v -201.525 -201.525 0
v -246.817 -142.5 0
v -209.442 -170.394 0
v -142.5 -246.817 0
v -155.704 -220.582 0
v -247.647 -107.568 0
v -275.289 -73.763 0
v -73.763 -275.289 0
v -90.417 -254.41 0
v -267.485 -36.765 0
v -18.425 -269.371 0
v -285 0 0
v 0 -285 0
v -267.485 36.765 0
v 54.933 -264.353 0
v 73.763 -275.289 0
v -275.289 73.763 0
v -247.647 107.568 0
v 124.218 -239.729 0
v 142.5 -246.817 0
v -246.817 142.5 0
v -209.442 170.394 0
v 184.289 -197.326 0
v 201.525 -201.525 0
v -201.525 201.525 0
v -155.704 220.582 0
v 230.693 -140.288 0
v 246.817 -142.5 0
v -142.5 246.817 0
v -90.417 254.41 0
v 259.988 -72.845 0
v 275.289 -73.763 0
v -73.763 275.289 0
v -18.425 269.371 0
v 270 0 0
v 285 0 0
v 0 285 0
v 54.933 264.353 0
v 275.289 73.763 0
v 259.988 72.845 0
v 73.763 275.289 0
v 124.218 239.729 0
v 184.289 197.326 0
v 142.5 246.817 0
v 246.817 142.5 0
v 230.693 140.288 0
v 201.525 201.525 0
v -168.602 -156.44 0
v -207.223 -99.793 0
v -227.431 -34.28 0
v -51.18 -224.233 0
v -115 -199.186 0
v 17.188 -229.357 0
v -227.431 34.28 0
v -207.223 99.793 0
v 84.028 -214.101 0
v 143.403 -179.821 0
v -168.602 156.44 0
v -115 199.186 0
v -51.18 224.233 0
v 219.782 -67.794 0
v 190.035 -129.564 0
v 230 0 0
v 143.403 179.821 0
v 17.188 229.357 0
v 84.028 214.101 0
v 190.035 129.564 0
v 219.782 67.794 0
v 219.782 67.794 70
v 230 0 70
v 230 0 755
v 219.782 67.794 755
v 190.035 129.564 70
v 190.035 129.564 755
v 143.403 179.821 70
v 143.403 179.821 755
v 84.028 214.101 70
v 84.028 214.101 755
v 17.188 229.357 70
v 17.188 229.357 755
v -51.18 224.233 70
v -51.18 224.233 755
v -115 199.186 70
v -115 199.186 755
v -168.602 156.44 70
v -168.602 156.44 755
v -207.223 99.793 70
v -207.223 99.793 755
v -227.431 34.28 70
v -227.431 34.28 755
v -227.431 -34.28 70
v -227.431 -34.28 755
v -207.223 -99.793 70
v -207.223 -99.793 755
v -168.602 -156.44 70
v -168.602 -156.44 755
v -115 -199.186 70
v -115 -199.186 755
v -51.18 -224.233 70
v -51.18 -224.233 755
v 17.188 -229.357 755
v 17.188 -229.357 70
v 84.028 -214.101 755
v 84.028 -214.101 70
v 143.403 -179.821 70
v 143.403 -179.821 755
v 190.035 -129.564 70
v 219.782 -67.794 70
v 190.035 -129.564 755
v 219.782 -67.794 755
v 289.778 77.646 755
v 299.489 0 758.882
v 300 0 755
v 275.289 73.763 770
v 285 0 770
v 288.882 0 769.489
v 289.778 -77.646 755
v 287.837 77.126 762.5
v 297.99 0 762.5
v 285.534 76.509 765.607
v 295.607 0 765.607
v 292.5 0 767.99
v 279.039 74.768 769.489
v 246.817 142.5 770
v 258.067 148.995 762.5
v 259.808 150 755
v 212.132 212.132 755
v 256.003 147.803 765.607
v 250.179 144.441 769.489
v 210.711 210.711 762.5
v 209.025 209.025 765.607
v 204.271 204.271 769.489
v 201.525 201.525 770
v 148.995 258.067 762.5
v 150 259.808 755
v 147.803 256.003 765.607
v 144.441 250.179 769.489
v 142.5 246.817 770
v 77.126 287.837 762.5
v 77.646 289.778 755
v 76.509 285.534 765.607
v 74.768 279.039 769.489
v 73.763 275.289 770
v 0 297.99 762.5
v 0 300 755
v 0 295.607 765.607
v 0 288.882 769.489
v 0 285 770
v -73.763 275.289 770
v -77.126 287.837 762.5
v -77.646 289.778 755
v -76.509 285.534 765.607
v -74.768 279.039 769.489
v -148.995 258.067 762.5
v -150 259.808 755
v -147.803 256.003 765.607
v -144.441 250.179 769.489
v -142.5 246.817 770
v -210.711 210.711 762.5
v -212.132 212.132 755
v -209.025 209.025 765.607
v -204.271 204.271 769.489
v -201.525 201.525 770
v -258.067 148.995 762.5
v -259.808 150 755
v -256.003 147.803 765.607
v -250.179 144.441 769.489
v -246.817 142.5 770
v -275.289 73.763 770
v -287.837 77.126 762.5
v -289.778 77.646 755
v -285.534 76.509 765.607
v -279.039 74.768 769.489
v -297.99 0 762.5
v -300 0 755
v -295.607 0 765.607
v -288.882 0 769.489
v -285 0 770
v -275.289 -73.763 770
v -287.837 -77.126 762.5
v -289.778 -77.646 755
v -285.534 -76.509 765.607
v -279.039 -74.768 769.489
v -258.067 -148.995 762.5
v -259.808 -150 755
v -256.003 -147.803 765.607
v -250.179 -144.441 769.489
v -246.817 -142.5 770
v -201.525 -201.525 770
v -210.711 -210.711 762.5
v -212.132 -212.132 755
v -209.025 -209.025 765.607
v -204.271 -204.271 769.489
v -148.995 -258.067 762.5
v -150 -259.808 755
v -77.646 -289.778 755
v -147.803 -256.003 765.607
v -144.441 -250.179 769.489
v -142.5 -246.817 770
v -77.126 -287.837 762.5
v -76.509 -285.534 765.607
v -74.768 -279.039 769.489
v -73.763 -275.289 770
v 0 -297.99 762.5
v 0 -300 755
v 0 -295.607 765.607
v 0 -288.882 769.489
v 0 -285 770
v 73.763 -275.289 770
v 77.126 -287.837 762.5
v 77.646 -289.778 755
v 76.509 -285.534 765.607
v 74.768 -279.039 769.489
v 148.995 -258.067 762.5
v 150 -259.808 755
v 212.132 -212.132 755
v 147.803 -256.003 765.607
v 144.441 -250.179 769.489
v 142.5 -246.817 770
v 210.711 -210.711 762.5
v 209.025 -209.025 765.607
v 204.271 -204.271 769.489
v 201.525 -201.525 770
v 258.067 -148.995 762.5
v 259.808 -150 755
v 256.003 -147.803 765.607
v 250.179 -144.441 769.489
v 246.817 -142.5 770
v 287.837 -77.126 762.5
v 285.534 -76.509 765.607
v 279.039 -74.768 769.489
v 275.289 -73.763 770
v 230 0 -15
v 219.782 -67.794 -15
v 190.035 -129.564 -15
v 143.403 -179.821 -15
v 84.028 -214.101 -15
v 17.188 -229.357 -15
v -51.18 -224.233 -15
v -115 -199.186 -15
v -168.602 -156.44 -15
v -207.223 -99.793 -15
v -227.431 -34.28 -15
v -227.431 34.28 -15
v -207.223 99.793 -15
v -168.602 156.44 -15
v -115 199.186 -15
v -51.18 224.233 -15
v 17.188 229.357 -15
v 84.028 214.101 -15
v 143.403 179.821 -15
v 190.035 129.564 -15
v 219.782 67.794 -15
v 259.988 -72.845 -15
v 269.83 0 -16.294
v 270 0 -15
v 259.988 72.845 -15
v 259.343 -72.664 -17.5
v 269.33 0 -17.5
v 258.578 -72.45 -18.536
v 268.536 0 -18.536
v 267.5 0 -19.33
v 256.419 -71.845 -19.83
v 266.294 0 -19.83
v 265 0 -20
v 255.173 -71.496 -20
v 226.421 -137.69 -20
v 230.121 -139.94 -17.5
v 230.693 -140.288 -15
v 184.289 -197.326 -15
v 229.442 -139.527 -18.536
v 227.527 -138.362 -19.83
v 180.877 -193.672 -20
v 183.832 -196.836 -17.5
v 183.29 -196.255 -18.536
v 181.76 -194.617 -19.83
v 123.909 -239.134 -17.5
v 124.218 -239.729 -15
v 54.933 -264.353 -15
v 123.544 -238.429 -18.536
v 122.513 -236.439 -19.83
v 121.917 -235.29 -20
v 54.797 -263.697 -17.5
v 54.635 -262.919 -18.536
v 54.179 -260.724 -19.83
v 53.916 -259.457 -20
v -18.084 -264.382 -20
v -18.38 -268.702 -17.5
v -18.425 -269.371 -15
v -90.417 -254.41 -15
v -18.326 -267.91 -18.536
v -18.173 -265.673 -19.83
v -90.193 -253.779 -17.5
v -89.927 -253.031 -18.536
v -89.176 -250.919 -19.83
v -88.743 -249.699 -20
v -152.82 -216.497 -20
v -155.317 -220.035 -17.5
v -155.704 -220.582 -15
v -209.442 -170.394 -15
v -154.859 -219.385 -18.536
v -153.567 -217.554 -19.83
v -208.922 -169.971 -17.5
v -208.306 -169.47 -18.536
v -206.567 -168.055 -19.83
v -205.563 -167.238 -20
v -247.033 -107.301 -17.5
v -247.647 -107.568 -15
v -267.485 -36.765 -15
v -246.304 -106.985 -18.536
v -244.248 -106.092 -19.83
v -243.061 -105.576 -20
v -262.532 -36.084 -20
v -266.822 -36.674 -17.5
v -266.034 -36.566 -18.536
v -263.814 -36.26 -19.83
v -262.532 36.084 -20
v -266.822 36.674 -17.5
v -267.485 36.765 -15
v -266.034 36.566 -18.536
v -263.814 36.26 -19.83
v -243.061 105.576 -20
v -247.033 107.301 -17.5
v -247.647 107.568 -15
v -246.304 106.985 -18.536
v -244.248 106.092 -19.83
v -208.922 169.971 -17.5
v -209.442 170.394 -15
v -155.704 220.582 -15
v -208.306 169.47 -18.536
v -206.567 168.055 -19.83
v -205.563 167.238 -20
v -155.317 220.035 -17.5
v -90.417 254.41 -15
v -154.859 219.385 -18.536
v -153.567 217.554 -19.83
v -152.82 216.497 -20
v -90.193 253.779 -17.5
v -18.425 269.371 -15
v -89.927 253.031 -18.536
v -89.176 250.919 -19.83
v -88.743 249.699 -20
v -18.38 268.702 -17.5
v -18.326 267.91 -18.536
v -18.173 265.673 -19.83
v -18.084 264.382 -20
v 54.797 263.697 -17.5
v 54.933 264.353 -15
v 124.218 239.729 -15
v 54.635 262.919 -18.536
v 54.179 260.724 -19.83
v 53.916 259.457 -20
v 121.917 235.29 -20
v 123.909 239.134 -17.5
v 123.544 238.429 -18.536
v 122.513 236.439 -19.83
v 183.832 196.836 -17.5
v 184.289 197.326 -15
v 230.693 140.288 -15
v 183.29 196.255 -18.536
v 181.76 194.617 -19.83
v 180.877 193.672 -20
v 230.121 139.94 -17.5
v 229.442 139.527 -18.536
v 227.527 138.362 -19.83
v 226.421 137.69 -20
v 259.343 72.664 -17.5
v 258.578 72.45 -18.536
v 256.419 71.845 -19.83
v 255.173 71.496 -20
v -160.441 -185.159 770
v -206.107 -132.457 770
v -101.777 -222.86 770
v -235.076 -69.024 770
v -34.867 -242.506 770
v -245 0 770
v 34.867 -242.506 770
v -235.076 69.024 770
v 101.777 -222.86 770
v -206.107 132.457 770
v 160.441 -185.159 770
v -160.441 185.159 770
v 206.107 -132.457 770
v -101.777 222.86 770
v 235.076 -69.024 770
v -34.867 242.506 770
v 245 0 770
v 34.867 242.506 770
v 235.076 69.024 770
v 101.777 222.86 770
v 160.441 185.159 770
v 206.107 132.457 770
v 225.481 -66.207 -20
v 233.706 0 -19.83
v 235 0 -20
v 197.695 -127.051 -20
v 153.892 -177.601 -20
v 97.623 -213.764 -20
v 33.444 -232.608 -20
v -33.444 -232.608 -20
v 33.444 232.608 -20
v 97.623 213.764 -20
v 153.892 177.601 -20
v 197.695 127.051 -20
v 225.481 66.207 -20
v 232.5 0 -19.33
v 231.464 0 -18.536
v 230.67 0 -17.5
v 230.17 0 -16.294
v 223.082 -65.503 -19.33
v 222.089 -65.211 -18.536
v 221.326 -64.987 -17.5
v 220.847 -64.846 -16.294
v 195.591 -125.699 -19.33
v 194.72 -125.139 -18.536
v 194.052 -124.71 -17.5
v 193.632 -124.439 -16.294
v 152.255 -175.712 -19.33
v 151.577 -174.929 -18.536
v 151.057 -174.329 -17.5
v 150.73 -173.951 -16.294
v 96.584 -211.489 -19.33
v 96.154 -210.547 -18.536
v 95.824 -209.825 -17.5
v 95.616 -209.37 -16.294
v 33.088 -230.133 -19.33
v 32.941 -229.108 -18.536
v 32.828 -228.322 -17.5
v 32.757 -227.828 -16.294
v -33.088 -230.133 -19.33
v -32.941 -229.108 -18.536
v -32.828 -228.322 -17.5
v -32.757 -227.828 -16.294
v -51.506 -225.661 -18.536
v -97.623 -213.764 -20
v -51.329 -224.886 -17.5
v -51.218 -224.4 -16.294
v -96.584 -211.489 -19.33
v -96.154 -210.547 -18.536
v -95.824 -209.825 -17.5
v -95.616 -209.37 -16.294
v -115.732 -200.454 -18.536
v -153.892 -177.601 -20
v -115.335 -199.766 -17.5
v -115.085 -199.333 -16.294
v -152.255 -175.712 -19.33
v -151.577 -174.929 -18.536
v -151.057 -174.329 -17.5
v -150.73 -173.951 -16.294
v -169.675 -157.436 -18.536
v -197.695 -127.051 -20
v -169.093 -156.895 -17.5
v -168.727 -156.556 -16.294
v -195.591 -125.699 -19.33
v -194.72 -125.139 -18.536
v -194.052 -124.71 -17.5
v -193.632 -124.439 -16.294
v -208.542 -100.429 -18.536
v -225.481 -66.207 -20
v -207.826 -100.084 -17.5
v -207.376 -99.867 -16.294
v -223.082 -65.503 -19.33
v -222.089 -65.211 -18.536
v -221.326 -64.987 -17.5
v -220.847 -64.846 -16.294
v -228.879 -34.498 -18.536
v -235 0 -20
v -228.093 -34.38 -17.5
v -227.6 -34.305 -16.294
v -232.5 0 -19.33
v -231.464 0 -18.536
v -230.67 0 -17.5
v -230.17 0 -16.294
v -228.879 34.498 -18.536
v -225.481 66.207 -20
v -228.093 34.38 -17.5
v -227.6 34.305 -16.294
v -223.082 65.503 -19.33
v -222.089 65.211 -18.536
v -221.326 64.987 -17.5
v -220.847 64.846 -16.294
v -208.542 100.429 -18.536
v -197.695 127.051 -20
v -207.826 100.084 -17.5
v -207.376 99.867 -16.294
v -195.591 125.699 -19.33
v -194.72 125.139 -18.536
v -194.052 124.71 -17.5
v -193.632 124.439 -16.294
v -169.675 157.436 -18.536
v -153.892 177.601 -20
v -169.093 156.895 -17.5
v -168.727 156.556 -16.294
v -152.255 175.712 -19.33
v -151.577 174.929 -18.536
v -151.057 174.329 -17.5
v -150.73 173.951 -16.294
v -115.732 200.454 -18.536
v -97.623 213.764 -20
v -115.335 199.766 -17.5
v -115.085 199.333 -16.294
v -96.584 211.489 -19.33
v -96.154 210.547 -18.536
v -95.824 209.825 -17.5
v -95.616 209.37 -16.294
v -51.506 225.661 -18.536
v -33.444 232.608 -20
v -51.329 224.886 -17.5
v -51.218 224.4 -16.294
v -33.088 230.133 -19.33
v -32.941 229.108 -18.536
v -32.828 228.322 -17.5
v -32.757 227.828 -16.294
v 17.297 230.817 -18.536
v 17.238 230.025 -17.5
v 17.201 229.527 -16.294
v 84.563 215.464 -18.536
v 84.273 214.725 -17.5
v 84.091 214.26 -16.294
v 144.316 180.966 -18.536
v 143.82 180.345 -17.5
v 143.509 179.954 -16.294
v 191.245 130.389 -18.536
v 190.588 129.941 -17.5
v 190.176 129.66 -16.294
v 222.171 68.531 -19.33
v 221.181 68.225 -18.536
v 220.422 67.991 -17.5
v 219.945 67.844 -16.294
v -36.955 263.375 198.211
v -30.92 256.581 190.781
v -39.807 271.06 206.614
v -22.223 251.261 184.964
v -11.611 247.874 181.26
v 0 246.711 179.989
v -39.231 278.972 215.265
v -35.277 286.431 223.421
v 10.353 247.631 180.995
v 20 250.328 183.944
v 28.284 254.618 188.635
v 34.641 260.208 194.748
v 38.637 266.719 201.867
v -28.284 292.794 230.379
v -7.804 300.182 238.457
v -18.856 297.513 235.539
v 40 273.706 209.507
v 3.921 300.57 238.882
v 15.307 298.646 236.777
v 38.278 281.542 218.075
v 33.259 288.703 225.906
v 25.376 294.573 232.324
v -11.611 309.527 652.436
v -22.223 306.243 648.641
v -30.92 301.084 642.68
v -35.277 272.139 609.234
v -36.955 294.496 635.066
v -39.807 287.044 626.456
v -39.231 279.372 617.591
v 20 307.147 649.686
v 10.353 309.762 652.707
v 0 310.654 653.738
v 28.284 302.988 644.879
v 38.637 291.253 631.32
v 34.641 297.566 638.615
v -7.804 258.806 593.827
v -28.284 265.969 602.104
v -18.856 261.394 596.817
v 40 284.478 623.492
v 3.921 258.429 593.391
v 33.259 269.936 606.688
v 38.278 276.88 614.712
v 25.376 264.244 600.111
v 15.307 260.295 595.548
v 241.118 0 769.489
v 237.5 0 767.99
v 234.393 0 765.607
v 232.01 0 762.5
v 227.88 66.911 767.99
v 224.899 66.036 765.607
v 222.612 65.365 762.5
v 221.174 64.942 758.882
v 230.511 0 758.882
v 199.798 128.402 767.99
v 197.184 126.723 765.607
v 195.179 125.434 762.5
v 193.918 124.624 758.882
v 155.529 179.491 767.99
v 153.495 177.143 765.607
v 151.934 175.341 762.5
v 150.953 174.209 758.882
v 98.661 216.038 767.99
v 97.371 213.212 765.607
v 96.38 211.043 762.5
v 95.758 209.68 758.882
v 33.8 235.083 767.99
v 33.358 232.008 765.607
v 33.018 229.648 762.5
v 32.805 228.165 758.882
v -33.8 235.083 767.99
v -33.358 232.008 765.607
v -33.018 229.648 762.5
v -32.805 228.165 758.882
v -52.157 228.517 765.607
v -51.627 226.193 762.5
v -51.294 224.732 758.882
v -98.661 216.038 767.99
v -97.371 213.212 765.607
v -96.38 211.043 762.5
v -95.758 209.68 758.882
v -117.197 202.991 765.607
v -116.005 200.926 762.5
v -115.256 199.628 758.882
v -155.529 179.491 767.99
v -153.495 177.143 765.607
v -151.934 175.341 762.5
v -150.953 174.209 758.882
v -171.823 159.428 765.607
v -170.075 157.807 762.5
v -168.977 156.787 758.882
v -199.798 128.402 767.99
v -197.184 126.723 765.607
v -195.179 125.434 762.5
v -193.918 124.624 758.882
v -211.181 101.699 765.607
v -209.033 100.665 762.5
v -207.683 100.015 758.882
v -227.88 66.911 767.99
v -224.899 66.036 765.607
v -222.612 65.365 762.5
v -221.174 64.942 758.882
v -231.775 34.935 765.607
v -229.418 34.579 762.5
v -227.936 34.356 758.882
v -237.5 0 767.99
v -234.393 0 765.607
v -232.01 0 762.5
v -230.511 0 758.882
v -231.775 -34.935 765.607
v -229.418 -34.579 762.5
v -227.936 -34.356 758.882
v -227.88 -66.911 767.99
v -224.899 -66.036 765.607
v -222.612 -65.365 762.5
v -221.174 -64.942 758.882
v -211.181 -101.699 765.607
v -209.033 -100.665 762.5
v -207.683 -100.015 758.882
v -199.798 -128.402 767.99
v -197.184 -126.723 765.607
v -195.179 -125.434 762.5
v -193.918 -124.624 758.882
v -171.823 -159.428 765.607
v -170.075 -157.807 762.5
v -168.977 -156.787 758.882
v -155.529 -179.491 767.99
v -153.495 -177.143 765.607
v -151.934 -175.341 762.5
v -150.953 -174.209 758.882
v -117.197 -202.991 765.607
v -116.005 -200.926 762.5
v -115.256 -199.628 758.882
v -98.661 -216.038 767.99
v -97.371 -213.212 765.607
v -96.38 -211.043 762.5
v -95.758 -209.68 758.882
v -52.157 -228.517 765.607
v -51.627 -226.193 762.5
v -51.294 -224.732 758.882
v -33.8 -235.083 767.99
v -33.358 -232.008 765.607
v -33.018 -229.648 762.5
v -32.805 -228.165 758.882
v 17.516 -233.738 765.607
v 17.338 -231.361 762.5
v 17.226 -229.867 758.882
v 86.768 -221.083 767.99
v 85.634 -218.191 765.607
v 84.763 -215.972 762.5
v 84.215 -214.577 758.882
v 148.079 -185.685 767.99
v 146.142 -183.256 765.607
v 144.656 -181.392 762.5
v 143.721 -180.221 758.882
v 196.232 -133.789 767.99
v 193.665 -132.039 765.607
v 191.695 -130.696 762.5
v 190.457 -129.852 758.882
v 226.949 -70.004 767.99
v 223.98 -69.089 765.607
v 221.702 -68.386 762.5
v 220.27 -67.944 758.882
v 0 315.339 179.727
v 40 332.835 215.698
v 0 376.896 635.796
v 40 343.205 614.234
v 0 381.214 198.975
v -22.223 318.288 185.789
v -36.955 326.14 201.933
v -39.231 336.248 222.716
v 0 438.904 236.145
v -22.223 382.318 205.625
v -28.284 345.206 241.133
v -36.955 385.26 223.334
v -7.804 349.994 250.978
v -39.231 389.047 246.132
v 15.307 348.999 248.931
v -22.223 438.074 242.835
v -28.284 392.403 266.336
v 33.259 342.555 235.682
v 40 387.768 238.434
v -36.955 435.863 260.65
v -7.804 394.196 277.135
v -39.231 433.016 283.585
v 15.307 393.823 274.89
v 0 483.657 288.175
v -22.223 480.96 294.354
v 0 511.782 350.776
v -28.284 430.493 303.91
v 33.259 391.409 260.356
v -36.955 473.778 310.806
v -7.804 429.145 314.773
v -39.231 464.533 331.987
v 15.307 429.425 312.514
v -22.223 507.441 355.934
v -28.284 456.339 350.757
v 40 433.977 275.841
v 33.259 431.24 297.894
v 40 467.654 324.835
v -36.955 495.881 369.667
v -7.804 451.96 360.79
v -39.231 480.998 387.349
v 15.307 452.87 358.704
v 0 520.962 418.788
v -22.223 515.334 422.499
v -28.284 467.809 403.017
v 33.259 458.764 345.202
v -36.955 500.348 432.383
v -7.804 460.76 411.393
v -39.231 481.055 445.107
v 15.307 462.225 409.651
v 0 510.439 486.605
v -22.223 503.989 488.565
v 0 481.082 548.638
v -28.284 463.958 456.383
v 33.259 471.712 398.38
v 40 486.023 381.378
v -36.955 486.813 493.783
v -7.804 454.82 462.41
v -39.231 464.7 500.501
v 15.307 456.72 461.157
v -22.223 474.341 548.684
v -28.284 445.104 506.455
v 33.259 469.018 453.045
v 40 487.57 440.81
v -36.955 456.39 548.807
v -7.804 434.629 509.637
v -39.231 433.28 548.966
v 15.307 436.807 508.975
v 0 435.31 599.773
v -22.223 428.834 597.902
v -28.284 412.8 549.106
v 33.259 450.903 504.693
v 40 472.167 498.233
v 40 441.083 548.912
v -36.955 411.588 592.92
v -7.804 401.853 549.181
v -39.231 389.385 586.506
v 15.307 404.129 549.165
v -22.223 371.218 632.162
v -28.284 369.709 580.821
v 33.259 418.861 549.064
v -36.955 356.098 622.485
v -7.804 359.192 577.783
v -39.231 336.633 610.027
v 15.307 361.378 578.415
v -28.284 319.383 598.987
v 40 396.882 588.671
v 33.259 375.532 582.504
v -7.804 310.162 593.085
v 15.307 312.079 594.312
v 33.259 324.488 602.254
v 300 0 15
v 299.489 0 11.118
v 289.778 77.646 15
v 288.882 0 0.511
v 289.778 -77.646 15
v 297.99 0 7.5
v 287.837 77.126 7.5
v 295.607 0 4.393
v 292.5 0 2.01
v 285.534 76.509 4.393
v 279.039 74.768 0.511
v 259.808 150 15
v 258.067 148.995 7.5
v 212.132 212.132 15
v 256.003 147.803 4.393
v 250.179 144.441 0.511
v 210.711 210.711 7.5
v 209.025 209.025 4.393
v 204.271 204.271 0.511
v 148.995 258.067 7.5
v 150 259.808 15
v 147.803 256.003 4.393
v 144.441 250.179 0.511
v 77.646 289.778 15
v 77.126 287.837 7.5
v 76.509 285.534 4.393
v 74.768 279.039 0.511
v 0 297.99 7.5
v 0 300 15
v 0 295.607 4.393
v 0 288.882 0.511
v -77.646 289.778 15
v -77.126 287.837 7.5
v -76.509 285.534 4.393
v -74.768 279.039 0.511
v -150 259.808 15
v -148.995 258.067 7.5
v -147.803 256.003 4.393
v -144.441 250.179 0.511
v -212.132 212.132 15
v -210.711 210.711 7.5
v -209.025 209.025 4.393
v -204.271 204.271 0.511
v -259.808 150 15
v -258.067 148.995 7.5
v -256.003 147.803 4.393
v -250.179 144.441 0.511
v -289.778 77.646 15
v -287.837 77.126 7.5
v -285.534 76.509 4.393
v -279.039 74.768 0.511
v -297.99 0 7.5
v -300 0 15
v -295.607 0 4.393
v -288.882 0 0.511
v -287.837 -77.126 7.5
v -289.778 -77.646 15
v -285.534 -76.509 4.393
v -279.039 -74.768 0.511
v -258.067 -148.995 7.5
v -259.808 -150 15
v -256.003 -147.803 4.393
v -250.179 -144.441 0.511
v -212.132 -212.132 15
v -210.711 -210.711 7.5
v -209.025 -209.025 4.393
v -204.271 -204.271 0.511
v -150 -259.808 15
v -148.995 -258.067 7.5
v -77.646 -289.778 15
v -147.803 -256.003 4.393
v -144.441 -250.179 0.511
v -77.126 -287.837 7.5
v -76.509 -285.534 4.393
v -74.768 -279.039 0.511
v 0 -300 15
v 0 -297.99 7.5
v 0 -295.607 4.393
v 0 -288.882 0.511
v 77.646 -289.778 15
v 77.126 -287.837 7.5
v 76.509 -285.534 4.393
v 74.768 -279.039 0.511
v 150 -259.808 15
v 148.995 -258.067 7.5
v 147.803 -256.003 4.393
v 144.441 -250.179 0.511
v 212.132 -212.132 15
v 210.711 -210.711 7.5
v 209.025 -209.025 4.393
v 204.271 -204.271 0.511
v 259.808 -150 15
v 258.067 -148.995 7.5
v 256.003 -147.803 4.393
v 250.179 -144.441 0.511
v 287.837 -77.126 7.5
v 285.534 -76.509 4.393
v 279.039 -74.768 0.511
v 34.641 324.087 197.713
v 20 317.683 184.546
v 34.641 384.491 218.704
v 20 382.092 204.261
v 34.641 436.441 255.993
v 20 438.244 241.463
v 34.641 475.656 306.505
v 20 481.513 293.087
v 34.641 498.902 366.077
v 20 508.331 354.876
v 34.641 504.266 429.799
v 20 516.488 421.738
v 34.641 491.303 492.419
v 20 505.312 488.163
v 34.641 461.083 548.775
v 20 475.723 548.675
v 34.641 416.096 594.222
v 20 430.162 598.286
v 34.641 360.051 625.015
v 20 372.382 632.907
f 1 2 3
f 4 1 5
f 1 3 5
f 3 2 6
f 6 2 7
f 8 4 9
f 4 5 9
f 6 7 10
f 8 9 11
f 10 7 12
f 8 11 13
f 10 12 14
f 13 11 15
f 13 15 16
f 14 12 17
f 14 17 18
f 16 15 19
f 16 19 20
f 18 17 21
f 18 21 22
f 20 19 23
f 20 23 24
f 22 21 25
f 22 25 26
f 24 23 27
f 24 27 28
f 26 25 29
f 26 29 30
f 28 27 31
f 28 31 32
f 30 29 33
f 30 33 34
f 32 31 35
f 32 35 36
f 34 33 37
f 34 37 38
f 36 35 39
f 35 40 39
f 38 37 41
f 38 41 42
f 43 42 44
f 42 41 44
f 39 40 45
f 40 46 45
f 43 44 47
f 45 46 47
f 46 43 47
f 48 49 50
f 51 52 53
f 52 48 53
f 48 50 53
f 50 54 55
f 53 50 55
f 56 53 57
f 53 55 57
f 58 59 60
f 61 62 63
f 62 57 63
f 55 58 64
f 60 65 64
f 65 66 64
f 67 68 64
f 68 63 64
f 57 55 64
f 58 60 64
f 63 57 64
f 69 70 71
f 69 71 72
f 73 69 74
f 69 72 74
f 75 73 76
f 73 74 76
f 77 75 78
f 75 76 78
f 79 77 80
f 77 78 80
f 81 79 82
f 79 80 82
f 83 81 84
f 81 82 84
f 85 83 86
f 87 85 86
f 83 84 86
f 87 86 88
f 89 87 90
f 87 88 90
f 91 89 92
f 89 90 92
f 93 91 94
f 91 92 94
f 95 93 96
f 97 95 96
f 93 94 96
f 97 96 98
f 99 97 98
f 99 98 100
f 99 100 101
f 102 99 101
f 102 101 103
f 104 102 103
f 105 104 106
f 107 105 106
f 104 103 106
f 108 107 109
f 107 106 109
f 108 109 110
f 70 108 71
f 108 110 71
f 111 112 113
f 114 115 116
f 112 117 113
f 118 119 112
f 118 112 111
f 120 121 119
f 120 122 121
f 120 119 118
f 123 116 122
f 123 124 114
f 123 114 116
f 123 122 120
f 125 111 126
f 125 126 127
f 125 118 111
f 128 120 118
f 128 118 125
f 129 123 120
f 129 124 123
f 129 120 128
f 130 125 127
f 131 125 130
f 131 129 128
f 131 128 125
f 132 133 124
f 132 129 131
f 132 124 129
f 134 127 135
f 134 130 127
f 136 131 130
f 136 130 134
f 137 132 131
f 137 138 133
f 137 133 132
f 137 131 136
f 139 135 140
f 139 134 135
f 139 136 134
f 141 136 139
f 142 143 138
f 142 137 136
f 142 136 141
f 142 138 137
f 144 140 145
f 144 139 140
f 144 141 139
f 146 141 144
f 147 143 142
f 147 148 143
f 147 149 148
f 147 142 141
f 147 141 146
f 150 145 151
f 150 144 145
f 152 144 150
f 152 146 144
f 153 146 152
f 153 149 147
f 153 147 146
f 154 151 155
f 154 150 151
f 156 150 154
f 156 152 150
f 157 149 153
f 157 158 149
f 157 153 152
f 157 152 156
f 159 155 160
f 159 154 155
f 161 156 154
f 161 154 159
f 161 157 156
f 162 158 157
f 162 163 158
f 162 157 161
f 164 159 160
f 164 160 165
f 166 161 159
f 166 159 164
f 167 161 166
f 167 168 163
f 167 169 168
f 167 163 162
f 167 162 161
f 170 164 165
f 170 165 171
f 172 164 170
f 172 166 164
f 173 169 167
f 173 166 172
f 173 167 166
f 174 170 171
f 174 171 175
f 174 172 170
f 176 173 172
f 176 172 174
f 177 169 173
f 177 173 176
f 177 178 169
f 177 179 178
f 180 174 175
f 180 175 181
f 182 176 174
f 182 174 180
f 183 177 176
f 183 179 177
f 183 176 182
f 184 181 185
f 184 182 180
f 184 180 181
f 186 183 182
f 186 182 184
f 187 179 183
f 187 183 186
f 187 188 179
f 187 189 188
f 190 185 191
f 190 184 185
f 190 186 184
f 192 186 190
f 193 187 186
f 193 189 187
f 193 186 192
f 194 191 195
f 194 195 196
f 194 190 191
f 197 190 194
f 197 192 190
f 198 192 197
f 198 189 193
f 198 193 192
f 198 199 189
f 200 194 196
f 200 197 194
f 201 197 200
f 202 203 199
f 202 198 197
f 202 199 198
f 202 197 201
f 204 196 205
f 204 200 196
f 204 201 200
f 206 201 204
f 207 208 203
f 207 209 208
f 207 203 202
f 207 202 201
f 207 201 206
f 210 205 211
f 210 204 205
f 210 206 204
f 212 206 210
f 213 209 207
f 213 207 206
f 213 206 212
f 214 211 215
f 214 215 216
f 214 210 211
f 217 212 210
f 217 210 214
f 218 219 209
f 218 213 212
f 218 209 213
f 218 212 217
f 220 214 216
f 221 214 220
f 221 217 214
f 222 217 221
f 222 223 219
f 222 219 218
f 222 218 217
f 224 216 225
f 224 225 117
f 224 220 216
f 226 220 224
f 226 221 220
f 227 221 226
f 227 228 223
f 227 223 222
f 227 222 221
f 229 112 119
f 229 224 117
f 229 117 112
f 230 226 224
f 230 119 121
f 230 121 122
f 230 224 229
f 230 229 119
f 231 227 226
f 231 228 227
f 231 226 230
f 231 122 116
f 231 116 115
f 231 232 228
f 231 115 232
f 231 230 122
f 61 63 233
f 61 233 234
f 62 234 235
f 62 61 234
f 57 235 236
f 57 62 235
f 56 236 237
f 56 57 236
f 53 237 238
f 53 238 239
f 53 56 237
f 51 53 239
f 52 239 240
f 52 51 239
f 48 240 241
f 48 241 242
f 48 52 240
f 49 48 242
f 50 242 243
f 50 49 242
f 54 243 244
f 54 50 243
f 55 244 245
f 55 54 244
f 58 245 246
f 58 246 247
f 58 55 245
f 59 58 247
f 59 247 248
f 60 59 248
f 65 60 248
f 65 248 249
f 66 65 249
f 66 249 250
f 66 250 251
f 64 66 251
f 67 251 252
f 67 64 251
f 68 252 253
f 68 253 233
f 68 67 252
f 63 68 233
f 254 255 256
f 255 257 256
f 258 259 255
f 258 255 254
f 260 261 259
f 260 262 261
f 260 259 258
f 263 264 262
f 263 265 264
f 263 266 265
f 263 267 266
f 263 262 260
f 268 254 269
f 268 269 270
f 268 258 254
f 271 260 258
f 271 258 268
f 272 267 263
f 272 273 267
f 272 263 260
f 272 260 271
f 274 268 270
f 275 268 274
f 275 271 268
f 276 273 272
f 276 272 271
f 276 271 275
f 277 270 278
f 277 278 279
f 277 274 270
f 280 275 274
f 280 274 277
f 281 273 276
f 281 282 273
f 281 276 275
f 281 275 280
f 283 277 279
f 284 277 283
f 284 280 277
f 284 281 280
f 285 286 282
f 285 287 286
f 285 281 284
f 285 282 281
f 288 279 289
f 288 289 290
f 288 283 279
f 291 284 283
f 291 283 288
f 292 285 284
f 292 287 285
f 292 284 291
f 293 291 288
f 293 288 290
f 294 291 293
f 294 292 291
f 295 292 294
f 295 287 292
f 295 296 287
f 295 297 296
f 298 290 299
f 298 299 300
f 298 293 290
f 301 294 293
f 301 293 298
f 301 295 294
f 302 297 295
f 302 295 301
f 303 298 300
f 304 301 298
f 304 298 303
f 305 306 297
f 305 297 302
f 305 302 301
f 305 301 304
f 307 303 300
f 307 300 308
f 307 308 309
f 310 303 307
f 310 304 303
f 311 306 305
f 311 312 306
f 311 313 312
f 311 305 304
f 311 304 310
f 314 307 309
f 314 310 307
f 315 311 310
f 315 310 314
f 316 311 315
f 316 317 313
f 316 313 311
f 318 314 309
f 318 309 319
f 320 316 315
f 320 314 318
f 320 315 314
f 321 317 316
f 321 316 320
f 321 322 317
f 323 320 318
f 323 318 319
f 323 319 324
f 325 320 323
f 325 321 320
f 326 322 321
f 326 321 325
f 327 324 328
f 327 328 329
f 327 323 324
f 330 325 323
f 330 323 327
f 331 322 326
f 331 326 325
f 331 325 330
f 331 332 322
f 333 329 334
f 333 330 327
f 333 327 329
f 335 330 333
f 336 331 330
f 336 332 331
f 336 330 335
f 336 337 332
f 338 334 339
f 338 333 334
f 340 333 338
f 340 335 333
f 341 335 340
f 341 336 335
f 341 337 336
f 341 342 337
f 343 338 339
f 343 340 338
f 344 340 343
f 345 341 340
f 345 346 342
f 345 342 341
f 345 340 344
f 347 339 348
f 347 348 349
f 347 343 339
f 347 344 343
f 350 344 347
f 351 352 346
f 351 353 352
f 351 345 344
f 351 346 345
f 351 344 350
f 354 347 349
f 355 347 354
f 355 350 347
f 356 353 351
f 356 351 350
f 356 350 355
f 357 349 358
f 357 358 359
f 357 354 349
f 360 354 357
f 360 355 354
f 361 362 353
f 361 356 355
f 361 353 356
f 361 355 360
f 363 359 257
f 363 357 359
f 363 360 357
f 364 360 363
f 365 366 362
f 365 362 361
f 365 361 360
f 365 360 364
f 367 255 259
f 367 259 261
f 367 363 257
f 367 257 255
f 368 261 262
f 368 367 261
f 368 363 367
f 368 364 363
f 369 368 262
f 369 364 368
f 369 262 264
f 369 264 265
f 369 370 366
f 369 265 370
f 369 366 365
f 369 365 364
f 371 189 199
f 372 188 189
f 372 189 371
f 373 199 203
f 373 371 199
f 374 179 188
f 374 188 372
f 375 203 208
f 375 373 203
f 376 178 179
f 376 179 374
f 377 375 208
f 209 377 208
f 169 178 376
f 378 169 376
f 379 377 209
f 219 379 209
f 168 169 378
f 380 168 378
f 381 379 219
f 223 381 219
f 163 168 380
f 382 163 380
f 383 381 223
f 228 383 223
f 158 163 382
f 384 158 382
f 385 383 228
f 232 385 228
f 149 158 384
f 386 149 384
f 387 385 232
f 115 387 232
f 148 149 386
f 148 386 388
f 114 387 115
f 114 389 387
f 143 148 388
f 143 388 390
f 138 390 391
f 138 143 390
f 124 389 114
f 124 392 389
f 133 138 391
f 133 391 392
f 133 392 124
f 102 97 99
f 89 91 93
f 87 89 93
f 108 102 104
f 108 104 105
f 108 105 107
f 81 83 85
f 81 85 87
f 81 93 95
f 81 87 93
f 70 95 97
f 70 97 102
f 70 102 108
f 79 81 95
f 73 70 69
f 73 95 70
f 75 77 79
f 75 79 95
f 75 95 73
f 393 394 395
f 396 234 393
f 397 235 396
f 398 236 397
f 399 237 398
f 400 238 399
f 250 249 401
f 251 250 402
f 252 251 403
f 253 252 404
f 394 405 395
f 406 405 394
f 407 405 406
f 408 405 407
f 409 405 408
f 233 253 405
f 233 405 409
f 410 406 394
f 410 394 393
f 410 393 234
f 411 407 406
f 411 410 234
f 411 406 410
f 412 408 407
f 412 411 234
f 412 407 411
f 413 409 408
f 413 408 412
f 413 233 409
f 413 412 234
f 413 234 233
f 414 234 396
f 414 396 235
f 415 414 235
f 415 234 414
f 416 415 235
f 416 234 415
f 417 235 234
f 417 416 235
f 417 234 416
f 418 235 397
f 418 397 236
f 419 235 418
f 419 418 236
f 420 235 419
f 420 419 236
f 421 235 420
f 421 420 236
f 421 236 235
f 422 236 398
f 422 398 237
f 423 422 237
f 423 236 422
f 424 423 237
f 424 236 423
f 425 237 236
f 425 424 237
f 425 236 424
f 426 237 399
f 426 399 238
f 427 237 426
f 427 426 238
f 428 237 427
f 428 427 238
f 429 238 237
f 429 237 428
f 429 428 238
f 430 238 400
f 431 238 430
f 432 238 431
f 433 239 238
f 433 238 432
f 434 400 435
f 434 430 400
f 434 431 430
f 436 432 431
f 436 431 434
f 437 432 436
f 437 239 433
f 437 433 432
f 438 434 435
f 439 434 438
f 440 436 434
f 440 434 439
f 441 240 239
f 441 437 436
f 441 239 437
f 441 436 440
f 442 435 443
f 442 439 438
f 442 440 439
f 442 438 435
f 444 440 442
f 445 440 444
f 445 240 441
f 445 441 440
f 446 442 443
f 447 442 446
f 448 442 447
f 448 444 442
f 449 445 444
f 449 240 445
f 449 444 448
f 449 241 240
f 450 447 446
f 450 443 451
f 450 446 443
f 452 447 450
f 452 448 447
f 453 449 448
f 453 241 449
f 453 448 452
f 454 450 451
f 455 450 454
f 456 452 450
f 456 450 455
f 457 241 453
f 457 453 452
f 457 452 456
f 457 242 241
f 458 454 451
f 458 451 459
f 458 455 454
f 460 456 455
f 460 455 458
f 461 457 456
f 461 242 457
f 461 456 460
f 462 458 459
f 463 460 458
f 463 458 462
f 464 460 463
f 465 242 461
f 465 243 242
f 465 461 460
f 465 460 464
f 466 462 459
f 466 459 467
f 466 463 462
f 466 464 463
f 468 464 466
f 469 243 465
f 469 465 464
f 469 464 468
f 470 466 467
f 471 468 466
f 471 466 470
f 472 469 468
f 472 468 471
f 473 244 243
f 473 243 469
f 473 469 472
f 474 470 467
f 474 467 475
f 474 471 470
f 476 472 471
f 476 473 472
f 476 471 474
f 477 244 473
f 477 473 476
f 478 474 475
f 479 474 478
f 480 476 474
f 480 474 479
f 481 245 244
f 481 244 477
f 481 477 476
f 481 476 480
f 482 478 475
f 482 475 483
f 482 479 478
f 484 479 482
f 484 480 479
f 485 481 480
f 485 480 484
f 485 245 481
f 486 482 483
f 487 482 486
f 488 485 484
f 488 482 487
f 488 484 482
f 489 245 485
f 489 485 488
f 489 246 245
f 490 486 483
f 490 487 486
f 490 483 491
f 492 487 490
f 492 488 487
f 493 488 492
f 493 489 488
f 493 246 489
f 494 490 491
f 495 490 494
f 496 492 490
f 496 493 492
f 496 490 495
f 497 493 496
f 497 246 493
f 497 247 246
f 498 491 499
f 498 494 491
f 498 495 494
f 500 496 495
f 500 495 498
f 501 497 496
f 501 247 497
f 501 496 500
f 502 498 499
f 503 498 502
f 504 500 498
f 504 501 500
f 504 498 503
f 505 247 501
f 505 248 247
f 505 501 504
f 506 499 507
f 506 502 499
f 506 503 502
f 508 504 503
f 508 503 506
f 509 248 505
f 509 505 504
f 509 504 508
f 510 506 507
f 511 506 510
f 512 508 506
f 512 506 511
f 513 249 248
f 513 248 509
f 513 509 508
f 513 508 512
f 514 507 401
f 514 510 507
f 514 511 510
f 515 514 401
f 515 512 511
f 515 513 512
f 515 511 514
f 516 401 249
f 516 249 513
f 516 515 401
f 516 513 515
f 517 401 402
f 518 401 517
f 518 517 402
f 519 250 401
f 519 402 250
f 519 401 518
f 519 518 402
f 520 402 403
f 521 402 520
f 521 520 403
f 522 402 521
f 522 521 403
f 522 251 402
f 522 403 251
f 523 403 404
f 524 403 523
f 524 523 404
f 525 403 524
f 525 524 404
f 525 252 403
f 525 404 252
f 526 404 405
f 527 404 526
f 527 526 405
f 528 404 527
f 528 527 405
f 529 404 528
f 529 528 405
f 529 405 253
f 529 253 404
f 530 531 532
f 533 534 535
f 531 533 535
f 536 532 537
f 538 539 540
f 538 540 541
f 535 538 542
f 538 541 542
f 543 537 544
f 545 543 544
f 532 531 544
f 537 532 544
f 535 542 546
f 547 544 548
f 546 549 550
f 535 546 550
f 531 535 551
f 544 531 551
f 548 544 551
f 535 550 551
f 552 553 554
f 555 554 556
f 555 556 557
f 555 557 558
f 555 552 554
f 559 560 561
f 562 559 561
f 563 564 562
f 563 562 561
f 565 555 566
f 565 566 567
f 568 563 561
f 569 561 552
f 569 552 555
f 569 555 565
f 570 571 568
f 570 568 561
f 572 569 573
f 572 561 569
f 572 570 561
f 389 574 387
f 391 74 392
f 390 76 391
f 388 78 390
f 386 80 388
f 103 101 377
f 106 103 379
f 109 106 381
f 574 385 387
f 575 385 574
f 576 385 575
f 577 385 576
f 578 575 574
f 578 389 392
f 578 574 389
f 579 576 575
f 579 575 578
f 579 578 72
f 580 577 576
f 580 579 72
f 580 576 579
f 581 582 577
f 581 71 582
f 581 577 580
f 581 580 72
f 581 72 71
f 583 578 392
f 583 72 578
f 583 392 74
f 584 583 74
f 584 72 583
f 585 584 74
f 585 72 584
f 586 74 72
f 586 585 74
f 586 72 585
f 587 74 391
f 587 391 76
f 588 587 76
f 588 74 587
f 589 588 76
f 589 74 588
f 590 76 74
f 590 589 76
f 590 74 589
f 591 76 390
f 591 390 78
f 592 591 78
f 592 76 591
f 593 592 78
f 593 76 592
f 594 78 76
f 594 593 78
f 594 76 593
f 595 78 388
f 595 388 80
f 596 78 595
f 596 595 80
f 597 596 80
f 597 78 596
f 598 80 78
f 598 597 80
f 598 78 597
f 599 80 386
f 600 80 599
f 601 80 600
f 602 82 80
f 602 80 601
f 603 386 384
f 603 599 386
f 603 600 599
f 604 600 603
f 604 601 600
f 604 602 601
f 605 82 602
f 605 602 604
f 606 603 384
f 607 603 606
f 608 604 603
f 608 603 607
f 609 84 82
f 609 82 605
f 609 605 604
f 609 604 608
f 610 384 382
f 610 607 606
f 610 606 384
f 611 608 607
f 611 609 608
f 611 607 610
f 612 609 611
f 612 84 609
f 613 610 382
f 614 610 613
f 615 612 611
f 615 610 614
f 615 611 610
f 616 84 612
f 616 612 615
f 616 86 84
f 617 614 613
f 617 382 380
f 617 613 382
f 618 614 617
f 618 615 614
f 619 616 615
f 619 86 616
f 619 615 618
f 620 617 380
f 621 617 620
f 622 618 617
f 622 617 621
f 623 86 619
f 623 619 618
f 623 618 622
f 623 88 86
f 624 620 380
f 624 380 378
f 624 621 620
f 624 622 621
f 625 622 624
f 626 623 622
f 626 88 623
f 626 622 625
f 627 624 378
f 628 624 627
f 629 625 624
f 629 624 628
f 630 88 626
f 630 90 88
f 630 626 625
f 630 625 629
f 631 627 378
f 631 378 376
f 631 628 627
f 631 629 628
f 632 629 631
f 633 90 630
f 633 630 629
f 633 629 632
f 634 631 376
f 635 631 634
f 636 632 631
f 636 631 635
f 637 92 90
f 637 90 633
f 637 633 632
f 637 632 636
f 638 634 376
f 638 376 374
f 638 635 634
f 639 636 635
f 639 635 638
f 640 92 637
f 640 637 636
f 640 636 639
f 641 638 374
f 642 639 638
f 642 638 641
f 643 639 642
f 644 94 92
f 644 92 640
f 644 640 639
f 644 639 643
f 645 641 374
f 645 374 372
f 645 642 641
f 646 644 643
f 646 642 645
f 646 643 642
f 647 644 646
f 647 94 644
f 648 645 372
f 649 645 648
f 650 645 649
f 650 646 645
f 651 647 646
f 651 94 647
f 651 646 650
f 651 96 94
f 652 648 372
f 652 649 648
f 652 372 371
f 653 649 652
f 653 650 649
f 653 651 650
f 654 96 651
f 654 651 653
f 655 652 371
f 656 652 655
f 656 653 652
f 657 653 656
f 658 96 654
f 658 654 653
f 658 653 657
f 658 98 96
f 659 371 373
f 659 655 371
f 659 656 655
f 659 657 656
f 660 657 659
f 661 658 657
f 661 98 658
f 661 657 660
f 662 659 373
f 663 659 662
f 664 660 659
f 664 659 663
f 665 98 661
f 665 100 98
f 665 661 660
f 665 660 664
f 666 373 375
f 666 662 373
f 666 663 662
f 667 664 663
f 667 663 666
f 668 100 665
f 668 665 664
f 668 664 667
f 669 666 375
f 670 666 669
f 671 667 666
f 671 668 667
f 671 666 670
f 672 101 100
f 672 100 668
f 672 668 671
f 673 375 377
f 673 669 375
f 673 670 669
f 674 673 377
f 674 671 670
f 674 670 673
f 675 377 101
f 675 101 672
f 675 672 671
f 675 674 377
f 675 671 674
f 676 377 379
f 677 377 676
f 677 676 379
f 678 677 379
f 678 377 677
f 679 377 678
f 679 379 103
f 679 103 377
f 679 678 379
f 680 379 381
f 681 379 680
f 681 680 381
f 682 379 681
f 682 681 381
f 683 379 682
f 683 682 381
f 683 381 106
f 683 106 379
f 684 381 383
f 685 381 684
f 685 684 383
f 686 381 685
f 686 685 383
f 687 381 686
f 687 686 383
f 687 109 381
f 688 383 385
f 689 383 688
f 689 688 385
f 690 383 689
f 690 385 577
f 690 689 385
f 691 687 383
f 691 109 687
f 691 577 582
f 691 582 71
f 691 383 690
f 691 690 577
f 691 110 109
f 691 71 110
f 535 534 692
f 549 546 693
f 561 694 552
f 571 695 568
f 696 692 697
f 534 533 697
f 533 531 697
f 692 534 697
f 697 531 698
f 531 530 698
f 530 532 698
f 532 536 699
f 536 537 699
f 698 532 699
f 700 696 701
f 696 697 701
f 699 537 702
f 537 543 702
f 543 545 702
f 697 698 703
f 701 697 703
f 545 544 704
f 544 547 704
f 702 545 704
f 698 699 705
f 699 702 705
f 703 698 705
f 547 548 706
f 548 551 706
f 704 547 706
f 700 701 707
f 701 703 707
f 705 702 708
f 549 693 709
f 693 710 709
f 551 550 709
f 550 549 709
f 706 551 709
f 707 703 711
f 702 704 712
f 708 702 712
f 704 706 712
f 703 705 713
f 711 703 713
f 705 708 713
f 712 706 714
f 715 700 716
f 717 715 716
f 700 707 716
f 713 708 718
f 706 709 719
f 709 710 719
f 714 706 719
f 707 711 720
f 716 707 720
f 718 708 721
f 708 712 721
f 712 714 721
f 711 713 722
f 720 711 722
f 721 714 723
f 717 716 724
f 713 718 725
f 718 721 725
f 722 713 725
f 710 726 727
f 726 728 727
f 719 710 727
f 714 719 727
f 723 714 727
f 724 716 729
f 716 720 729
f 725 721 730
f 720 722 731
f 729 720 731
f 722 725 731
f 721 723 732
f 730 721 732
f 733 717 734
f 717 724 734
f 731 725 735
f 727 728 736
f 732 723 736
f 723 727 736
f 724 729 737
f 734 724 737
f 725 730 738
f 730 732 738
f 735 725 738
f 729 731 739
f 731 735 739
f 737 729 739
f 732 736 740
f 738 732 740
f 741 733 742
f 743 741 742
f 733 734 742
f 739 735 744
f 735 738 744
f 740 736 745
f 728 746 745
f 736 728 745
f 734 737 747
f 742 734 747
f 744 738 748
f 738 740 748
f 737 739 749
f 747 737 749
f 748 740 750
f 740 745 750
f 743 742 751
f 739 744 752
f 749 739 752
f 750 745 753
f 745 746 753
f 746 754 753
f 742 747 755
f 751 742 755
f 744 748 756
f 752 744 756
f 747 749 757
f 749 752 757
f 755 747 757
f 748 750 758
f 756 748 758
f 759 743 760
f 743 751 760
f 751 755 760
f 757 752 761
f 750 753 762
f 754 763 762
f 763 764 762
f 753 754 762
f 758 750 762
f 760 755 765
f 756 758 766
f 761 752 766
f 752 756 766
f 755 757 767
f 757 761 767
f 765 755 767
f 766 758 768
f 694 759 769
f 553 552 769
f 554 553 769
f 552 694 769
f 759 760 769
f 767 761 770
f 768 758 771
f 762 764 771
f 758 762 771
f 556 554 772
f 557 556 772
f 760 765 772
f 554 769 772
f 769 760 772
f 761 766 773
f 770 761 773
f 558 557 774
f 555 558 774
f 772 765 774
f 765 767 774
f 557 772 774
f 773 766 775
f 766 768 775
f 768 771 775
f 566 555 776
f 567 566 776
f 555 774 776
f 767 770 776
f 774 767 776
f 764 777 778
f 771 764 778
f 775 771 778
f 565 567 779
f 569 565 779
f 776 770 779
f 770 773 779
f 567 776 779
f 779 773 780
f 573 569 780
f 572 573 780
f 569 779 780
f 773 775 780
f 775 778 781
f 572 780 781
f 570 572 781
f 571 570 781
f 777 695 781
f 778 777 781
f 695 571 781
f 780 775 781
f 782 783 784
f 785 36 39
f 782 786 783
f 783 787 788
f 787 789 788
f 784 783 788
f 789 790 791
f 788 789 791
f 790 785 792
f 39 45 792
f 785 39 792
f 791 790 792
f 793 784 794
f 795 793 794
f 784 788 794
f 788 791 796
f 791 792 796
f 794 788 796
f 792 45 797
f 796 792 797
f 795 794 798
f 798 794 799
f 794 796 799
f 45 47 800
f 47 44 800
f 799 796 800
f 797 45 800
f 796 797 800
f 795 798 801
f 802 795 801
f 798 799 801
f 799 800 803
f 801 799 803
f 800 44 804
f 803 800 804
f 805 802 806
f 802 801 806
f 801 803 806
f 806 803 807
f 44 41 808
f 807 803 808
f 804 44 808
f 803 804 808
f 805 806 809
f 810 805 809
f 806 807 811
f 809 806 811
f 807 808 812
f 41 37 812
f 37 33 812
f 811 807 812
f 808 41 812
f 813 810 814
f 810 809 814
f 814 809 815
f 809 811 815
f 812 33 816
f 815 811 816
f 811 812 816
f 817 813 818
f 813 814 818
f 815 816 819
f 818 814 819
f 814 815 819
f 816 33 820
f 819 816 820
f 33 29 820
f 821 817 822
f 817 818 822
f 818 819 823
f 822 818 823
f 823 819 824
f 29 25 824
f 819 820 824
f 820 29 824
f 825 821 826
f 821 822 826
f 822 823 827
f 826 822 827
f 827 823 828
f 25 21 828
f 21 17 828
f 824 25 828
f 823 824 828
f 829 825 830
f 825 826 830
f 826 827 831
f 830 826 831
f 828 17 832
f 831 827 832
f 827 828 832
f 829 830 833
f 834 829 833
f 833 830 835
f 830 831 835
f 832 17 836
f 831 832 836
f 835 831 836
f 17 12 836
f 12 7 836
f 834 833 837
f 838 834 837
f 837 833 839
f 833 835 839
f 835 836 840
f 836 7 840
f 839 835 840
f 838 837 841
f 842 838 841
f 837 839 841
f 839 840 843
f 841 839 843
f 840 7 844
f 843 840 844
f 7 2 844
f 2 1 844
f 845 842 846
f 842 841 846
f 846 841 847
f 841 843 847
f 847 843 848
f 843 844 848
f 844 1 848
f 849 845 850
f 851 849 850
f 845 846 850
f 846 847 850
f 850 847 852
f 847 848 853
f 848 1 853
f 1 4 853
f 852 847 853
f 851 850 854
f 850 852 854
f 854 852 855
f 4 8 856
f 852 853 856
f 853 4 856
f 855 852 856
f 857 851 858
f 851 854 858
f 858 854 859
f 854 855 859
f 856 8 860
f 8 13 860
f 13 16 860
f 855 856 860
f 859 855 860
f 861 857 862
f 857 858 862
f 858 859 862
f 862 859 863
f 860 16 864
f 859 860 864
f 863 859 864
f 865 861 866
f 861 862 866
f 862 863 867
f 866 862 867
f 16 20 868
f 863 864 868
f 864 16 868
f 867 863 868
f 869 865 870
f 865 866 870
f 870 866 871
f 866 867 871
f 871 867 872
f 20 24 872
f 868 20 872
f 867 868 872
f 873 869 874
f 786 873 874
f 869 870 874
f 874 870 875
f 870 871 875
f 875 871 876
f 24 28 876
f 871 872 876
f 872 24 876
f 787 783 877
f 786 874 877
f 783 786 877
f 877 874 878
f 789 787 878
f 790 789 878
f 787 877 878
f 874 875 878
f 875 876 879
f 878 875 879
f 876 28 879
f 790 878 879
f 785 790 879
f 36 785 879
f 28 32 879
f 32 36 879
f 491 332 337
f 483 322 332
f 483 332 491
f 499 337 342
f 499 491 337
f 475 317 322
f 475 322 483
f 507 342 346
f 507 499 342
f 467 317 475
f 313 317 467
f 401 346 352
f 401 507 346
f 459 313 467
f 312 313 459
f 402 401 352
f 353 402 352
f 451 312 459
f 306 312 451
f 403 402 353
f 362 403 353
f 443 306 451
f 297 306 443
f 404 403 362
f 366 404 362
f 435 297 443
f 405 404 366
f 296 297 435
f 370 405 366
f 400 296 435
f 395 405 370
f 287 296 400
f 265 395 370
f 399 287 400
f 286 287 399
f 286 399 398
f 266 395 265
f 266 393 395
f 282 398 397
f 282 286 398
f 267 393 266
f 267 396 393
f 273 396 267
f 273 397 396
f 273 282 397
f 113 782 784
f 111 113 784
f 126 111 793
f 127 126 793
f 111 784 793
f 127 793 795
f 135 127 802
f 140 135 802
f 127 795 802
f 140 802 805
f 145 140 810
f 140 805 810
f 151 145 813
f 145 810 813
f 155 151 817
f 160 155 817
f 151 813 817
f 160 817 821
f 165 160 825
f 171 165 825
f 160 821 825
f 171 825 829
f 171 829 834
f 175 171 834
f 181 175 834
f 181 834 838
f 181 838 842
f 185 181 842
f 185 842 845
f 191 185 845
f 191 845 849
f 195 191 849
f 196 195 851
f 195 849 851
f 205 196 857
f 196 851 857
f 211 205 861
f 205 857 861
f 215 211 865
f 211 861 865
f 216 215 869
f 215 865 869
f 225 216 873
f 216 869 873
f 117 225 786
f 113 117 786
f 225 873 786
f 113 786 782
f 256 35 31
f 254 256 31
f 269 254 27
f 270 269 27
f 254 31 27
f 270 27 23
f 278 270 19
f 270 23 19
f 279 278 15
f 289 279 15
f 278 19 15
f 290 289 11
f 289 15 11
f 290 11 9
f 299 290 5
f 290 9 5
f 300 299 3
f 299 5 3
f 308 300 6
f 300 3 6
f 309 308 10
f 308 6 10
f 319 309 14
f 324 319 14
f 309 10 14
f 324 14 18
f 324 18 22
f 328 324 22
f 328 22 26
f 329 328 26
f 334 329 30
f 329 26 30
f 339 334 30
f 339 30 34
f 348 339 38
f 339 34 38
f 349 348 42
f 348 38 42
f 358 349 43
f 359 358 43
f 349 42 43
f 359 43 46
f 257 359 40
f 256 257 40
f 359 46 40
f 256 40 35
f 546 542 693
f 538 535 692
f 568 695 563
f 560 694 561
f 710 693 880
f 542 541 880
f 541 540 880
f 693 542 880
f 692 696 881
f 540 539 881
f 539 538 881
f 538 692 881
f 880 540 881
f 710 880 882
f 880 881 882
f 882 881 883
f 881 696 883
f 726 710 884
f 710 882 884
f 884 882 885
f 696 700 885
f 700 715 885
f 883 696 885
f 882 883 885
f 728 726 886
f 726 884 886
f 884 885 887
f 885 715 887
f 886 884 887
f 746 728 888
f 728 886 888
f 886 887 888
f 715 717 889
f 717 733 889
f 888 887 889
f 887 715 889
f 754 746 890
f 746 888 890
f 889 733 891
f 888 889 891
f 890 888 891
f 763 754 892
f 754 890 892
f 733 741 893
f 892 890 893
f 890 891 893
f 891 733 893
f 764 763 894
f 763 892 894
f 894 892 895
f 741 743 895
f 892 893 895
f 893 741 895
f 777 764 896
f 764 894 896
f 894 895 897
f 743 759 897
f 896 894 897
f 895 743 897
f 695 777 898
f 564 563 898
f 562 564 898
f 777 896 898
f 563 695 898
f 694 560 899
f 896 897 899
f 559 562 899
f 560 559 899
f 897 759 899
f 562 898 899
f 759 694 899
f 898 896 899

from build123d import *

# Parameters (mm, degrees)
F0_R     = 300
F1_DEPTH = 770
F2_R     = 230
F3_DEPTH = 700
F4_R     = 15
F5_R     = 270
F5_R_2   = 230
F6_DEPTH = 20
F7_R     = 5


with BuildPart() as f1:
    # F0 (on Top) → F1 (new body)
    with BuildSketch(Plane.XY):
        Circle(F0_R)
    extrude(amount=F1_DEPTH)

    # F2 (on face) → F3 (cut)
    with BuildSketch(Plane.XY.offset(770)):
        Circle(F2_R)
    extrude(amount=-F3_DEPTH, mode=Mode.SUBTRACT)

    # F4
    f4_edges = [f1.edges().sort_by_distance(p)[0] for p in [
        (-300, 0, 770),
        (-230, 0, 770),
        (-300, 0, 0),
    ]]
    fillet(f4_edges, radius=F4_R)

    # F5 (on face) → F6 (join)
    with BuildSketch(Plane(origin=(0, 0, 0), x_dir=(1, 0, 0), z_dir=(0, 0, -1))):
        Circle(F5_R)
        Circle(F5_R_2, mode=Mode.SUBTRACT)
    extrude(amount=F6_DEPTH)

    # F7
    f7_edges = [f1.edges().sort_by_distance(p)[0] for p in [
        (-270, 0, -20),
        (-230, 0, -20),
    ]]
    fillet(f7_edges, radius=F7_R)


with BuildPart() as f12:
    # F12: sweep along a path in F11
    with BuildLine(Plane.YZ) as f12_path:
        ThreePointArc((280.041266, 216.43436), (481.926647, 417.278558), (278.335223, 616.393175))
    # F10 (on offset) → F12 (sweep)
    with BuildSketch(Plane.XY.offset(550)):
        with BuildLine():
            ThreePointArc((0, 480.171301), (-28.284271, 411.88703), (40, 440.171301))
            ThreePointArc((40, 440.171301), (28.284271, 468.455573), (0, 480.171301))
        make_face()
    sweep(path=f12_path.line)


solid = Compound([f1.part, f12.part])
